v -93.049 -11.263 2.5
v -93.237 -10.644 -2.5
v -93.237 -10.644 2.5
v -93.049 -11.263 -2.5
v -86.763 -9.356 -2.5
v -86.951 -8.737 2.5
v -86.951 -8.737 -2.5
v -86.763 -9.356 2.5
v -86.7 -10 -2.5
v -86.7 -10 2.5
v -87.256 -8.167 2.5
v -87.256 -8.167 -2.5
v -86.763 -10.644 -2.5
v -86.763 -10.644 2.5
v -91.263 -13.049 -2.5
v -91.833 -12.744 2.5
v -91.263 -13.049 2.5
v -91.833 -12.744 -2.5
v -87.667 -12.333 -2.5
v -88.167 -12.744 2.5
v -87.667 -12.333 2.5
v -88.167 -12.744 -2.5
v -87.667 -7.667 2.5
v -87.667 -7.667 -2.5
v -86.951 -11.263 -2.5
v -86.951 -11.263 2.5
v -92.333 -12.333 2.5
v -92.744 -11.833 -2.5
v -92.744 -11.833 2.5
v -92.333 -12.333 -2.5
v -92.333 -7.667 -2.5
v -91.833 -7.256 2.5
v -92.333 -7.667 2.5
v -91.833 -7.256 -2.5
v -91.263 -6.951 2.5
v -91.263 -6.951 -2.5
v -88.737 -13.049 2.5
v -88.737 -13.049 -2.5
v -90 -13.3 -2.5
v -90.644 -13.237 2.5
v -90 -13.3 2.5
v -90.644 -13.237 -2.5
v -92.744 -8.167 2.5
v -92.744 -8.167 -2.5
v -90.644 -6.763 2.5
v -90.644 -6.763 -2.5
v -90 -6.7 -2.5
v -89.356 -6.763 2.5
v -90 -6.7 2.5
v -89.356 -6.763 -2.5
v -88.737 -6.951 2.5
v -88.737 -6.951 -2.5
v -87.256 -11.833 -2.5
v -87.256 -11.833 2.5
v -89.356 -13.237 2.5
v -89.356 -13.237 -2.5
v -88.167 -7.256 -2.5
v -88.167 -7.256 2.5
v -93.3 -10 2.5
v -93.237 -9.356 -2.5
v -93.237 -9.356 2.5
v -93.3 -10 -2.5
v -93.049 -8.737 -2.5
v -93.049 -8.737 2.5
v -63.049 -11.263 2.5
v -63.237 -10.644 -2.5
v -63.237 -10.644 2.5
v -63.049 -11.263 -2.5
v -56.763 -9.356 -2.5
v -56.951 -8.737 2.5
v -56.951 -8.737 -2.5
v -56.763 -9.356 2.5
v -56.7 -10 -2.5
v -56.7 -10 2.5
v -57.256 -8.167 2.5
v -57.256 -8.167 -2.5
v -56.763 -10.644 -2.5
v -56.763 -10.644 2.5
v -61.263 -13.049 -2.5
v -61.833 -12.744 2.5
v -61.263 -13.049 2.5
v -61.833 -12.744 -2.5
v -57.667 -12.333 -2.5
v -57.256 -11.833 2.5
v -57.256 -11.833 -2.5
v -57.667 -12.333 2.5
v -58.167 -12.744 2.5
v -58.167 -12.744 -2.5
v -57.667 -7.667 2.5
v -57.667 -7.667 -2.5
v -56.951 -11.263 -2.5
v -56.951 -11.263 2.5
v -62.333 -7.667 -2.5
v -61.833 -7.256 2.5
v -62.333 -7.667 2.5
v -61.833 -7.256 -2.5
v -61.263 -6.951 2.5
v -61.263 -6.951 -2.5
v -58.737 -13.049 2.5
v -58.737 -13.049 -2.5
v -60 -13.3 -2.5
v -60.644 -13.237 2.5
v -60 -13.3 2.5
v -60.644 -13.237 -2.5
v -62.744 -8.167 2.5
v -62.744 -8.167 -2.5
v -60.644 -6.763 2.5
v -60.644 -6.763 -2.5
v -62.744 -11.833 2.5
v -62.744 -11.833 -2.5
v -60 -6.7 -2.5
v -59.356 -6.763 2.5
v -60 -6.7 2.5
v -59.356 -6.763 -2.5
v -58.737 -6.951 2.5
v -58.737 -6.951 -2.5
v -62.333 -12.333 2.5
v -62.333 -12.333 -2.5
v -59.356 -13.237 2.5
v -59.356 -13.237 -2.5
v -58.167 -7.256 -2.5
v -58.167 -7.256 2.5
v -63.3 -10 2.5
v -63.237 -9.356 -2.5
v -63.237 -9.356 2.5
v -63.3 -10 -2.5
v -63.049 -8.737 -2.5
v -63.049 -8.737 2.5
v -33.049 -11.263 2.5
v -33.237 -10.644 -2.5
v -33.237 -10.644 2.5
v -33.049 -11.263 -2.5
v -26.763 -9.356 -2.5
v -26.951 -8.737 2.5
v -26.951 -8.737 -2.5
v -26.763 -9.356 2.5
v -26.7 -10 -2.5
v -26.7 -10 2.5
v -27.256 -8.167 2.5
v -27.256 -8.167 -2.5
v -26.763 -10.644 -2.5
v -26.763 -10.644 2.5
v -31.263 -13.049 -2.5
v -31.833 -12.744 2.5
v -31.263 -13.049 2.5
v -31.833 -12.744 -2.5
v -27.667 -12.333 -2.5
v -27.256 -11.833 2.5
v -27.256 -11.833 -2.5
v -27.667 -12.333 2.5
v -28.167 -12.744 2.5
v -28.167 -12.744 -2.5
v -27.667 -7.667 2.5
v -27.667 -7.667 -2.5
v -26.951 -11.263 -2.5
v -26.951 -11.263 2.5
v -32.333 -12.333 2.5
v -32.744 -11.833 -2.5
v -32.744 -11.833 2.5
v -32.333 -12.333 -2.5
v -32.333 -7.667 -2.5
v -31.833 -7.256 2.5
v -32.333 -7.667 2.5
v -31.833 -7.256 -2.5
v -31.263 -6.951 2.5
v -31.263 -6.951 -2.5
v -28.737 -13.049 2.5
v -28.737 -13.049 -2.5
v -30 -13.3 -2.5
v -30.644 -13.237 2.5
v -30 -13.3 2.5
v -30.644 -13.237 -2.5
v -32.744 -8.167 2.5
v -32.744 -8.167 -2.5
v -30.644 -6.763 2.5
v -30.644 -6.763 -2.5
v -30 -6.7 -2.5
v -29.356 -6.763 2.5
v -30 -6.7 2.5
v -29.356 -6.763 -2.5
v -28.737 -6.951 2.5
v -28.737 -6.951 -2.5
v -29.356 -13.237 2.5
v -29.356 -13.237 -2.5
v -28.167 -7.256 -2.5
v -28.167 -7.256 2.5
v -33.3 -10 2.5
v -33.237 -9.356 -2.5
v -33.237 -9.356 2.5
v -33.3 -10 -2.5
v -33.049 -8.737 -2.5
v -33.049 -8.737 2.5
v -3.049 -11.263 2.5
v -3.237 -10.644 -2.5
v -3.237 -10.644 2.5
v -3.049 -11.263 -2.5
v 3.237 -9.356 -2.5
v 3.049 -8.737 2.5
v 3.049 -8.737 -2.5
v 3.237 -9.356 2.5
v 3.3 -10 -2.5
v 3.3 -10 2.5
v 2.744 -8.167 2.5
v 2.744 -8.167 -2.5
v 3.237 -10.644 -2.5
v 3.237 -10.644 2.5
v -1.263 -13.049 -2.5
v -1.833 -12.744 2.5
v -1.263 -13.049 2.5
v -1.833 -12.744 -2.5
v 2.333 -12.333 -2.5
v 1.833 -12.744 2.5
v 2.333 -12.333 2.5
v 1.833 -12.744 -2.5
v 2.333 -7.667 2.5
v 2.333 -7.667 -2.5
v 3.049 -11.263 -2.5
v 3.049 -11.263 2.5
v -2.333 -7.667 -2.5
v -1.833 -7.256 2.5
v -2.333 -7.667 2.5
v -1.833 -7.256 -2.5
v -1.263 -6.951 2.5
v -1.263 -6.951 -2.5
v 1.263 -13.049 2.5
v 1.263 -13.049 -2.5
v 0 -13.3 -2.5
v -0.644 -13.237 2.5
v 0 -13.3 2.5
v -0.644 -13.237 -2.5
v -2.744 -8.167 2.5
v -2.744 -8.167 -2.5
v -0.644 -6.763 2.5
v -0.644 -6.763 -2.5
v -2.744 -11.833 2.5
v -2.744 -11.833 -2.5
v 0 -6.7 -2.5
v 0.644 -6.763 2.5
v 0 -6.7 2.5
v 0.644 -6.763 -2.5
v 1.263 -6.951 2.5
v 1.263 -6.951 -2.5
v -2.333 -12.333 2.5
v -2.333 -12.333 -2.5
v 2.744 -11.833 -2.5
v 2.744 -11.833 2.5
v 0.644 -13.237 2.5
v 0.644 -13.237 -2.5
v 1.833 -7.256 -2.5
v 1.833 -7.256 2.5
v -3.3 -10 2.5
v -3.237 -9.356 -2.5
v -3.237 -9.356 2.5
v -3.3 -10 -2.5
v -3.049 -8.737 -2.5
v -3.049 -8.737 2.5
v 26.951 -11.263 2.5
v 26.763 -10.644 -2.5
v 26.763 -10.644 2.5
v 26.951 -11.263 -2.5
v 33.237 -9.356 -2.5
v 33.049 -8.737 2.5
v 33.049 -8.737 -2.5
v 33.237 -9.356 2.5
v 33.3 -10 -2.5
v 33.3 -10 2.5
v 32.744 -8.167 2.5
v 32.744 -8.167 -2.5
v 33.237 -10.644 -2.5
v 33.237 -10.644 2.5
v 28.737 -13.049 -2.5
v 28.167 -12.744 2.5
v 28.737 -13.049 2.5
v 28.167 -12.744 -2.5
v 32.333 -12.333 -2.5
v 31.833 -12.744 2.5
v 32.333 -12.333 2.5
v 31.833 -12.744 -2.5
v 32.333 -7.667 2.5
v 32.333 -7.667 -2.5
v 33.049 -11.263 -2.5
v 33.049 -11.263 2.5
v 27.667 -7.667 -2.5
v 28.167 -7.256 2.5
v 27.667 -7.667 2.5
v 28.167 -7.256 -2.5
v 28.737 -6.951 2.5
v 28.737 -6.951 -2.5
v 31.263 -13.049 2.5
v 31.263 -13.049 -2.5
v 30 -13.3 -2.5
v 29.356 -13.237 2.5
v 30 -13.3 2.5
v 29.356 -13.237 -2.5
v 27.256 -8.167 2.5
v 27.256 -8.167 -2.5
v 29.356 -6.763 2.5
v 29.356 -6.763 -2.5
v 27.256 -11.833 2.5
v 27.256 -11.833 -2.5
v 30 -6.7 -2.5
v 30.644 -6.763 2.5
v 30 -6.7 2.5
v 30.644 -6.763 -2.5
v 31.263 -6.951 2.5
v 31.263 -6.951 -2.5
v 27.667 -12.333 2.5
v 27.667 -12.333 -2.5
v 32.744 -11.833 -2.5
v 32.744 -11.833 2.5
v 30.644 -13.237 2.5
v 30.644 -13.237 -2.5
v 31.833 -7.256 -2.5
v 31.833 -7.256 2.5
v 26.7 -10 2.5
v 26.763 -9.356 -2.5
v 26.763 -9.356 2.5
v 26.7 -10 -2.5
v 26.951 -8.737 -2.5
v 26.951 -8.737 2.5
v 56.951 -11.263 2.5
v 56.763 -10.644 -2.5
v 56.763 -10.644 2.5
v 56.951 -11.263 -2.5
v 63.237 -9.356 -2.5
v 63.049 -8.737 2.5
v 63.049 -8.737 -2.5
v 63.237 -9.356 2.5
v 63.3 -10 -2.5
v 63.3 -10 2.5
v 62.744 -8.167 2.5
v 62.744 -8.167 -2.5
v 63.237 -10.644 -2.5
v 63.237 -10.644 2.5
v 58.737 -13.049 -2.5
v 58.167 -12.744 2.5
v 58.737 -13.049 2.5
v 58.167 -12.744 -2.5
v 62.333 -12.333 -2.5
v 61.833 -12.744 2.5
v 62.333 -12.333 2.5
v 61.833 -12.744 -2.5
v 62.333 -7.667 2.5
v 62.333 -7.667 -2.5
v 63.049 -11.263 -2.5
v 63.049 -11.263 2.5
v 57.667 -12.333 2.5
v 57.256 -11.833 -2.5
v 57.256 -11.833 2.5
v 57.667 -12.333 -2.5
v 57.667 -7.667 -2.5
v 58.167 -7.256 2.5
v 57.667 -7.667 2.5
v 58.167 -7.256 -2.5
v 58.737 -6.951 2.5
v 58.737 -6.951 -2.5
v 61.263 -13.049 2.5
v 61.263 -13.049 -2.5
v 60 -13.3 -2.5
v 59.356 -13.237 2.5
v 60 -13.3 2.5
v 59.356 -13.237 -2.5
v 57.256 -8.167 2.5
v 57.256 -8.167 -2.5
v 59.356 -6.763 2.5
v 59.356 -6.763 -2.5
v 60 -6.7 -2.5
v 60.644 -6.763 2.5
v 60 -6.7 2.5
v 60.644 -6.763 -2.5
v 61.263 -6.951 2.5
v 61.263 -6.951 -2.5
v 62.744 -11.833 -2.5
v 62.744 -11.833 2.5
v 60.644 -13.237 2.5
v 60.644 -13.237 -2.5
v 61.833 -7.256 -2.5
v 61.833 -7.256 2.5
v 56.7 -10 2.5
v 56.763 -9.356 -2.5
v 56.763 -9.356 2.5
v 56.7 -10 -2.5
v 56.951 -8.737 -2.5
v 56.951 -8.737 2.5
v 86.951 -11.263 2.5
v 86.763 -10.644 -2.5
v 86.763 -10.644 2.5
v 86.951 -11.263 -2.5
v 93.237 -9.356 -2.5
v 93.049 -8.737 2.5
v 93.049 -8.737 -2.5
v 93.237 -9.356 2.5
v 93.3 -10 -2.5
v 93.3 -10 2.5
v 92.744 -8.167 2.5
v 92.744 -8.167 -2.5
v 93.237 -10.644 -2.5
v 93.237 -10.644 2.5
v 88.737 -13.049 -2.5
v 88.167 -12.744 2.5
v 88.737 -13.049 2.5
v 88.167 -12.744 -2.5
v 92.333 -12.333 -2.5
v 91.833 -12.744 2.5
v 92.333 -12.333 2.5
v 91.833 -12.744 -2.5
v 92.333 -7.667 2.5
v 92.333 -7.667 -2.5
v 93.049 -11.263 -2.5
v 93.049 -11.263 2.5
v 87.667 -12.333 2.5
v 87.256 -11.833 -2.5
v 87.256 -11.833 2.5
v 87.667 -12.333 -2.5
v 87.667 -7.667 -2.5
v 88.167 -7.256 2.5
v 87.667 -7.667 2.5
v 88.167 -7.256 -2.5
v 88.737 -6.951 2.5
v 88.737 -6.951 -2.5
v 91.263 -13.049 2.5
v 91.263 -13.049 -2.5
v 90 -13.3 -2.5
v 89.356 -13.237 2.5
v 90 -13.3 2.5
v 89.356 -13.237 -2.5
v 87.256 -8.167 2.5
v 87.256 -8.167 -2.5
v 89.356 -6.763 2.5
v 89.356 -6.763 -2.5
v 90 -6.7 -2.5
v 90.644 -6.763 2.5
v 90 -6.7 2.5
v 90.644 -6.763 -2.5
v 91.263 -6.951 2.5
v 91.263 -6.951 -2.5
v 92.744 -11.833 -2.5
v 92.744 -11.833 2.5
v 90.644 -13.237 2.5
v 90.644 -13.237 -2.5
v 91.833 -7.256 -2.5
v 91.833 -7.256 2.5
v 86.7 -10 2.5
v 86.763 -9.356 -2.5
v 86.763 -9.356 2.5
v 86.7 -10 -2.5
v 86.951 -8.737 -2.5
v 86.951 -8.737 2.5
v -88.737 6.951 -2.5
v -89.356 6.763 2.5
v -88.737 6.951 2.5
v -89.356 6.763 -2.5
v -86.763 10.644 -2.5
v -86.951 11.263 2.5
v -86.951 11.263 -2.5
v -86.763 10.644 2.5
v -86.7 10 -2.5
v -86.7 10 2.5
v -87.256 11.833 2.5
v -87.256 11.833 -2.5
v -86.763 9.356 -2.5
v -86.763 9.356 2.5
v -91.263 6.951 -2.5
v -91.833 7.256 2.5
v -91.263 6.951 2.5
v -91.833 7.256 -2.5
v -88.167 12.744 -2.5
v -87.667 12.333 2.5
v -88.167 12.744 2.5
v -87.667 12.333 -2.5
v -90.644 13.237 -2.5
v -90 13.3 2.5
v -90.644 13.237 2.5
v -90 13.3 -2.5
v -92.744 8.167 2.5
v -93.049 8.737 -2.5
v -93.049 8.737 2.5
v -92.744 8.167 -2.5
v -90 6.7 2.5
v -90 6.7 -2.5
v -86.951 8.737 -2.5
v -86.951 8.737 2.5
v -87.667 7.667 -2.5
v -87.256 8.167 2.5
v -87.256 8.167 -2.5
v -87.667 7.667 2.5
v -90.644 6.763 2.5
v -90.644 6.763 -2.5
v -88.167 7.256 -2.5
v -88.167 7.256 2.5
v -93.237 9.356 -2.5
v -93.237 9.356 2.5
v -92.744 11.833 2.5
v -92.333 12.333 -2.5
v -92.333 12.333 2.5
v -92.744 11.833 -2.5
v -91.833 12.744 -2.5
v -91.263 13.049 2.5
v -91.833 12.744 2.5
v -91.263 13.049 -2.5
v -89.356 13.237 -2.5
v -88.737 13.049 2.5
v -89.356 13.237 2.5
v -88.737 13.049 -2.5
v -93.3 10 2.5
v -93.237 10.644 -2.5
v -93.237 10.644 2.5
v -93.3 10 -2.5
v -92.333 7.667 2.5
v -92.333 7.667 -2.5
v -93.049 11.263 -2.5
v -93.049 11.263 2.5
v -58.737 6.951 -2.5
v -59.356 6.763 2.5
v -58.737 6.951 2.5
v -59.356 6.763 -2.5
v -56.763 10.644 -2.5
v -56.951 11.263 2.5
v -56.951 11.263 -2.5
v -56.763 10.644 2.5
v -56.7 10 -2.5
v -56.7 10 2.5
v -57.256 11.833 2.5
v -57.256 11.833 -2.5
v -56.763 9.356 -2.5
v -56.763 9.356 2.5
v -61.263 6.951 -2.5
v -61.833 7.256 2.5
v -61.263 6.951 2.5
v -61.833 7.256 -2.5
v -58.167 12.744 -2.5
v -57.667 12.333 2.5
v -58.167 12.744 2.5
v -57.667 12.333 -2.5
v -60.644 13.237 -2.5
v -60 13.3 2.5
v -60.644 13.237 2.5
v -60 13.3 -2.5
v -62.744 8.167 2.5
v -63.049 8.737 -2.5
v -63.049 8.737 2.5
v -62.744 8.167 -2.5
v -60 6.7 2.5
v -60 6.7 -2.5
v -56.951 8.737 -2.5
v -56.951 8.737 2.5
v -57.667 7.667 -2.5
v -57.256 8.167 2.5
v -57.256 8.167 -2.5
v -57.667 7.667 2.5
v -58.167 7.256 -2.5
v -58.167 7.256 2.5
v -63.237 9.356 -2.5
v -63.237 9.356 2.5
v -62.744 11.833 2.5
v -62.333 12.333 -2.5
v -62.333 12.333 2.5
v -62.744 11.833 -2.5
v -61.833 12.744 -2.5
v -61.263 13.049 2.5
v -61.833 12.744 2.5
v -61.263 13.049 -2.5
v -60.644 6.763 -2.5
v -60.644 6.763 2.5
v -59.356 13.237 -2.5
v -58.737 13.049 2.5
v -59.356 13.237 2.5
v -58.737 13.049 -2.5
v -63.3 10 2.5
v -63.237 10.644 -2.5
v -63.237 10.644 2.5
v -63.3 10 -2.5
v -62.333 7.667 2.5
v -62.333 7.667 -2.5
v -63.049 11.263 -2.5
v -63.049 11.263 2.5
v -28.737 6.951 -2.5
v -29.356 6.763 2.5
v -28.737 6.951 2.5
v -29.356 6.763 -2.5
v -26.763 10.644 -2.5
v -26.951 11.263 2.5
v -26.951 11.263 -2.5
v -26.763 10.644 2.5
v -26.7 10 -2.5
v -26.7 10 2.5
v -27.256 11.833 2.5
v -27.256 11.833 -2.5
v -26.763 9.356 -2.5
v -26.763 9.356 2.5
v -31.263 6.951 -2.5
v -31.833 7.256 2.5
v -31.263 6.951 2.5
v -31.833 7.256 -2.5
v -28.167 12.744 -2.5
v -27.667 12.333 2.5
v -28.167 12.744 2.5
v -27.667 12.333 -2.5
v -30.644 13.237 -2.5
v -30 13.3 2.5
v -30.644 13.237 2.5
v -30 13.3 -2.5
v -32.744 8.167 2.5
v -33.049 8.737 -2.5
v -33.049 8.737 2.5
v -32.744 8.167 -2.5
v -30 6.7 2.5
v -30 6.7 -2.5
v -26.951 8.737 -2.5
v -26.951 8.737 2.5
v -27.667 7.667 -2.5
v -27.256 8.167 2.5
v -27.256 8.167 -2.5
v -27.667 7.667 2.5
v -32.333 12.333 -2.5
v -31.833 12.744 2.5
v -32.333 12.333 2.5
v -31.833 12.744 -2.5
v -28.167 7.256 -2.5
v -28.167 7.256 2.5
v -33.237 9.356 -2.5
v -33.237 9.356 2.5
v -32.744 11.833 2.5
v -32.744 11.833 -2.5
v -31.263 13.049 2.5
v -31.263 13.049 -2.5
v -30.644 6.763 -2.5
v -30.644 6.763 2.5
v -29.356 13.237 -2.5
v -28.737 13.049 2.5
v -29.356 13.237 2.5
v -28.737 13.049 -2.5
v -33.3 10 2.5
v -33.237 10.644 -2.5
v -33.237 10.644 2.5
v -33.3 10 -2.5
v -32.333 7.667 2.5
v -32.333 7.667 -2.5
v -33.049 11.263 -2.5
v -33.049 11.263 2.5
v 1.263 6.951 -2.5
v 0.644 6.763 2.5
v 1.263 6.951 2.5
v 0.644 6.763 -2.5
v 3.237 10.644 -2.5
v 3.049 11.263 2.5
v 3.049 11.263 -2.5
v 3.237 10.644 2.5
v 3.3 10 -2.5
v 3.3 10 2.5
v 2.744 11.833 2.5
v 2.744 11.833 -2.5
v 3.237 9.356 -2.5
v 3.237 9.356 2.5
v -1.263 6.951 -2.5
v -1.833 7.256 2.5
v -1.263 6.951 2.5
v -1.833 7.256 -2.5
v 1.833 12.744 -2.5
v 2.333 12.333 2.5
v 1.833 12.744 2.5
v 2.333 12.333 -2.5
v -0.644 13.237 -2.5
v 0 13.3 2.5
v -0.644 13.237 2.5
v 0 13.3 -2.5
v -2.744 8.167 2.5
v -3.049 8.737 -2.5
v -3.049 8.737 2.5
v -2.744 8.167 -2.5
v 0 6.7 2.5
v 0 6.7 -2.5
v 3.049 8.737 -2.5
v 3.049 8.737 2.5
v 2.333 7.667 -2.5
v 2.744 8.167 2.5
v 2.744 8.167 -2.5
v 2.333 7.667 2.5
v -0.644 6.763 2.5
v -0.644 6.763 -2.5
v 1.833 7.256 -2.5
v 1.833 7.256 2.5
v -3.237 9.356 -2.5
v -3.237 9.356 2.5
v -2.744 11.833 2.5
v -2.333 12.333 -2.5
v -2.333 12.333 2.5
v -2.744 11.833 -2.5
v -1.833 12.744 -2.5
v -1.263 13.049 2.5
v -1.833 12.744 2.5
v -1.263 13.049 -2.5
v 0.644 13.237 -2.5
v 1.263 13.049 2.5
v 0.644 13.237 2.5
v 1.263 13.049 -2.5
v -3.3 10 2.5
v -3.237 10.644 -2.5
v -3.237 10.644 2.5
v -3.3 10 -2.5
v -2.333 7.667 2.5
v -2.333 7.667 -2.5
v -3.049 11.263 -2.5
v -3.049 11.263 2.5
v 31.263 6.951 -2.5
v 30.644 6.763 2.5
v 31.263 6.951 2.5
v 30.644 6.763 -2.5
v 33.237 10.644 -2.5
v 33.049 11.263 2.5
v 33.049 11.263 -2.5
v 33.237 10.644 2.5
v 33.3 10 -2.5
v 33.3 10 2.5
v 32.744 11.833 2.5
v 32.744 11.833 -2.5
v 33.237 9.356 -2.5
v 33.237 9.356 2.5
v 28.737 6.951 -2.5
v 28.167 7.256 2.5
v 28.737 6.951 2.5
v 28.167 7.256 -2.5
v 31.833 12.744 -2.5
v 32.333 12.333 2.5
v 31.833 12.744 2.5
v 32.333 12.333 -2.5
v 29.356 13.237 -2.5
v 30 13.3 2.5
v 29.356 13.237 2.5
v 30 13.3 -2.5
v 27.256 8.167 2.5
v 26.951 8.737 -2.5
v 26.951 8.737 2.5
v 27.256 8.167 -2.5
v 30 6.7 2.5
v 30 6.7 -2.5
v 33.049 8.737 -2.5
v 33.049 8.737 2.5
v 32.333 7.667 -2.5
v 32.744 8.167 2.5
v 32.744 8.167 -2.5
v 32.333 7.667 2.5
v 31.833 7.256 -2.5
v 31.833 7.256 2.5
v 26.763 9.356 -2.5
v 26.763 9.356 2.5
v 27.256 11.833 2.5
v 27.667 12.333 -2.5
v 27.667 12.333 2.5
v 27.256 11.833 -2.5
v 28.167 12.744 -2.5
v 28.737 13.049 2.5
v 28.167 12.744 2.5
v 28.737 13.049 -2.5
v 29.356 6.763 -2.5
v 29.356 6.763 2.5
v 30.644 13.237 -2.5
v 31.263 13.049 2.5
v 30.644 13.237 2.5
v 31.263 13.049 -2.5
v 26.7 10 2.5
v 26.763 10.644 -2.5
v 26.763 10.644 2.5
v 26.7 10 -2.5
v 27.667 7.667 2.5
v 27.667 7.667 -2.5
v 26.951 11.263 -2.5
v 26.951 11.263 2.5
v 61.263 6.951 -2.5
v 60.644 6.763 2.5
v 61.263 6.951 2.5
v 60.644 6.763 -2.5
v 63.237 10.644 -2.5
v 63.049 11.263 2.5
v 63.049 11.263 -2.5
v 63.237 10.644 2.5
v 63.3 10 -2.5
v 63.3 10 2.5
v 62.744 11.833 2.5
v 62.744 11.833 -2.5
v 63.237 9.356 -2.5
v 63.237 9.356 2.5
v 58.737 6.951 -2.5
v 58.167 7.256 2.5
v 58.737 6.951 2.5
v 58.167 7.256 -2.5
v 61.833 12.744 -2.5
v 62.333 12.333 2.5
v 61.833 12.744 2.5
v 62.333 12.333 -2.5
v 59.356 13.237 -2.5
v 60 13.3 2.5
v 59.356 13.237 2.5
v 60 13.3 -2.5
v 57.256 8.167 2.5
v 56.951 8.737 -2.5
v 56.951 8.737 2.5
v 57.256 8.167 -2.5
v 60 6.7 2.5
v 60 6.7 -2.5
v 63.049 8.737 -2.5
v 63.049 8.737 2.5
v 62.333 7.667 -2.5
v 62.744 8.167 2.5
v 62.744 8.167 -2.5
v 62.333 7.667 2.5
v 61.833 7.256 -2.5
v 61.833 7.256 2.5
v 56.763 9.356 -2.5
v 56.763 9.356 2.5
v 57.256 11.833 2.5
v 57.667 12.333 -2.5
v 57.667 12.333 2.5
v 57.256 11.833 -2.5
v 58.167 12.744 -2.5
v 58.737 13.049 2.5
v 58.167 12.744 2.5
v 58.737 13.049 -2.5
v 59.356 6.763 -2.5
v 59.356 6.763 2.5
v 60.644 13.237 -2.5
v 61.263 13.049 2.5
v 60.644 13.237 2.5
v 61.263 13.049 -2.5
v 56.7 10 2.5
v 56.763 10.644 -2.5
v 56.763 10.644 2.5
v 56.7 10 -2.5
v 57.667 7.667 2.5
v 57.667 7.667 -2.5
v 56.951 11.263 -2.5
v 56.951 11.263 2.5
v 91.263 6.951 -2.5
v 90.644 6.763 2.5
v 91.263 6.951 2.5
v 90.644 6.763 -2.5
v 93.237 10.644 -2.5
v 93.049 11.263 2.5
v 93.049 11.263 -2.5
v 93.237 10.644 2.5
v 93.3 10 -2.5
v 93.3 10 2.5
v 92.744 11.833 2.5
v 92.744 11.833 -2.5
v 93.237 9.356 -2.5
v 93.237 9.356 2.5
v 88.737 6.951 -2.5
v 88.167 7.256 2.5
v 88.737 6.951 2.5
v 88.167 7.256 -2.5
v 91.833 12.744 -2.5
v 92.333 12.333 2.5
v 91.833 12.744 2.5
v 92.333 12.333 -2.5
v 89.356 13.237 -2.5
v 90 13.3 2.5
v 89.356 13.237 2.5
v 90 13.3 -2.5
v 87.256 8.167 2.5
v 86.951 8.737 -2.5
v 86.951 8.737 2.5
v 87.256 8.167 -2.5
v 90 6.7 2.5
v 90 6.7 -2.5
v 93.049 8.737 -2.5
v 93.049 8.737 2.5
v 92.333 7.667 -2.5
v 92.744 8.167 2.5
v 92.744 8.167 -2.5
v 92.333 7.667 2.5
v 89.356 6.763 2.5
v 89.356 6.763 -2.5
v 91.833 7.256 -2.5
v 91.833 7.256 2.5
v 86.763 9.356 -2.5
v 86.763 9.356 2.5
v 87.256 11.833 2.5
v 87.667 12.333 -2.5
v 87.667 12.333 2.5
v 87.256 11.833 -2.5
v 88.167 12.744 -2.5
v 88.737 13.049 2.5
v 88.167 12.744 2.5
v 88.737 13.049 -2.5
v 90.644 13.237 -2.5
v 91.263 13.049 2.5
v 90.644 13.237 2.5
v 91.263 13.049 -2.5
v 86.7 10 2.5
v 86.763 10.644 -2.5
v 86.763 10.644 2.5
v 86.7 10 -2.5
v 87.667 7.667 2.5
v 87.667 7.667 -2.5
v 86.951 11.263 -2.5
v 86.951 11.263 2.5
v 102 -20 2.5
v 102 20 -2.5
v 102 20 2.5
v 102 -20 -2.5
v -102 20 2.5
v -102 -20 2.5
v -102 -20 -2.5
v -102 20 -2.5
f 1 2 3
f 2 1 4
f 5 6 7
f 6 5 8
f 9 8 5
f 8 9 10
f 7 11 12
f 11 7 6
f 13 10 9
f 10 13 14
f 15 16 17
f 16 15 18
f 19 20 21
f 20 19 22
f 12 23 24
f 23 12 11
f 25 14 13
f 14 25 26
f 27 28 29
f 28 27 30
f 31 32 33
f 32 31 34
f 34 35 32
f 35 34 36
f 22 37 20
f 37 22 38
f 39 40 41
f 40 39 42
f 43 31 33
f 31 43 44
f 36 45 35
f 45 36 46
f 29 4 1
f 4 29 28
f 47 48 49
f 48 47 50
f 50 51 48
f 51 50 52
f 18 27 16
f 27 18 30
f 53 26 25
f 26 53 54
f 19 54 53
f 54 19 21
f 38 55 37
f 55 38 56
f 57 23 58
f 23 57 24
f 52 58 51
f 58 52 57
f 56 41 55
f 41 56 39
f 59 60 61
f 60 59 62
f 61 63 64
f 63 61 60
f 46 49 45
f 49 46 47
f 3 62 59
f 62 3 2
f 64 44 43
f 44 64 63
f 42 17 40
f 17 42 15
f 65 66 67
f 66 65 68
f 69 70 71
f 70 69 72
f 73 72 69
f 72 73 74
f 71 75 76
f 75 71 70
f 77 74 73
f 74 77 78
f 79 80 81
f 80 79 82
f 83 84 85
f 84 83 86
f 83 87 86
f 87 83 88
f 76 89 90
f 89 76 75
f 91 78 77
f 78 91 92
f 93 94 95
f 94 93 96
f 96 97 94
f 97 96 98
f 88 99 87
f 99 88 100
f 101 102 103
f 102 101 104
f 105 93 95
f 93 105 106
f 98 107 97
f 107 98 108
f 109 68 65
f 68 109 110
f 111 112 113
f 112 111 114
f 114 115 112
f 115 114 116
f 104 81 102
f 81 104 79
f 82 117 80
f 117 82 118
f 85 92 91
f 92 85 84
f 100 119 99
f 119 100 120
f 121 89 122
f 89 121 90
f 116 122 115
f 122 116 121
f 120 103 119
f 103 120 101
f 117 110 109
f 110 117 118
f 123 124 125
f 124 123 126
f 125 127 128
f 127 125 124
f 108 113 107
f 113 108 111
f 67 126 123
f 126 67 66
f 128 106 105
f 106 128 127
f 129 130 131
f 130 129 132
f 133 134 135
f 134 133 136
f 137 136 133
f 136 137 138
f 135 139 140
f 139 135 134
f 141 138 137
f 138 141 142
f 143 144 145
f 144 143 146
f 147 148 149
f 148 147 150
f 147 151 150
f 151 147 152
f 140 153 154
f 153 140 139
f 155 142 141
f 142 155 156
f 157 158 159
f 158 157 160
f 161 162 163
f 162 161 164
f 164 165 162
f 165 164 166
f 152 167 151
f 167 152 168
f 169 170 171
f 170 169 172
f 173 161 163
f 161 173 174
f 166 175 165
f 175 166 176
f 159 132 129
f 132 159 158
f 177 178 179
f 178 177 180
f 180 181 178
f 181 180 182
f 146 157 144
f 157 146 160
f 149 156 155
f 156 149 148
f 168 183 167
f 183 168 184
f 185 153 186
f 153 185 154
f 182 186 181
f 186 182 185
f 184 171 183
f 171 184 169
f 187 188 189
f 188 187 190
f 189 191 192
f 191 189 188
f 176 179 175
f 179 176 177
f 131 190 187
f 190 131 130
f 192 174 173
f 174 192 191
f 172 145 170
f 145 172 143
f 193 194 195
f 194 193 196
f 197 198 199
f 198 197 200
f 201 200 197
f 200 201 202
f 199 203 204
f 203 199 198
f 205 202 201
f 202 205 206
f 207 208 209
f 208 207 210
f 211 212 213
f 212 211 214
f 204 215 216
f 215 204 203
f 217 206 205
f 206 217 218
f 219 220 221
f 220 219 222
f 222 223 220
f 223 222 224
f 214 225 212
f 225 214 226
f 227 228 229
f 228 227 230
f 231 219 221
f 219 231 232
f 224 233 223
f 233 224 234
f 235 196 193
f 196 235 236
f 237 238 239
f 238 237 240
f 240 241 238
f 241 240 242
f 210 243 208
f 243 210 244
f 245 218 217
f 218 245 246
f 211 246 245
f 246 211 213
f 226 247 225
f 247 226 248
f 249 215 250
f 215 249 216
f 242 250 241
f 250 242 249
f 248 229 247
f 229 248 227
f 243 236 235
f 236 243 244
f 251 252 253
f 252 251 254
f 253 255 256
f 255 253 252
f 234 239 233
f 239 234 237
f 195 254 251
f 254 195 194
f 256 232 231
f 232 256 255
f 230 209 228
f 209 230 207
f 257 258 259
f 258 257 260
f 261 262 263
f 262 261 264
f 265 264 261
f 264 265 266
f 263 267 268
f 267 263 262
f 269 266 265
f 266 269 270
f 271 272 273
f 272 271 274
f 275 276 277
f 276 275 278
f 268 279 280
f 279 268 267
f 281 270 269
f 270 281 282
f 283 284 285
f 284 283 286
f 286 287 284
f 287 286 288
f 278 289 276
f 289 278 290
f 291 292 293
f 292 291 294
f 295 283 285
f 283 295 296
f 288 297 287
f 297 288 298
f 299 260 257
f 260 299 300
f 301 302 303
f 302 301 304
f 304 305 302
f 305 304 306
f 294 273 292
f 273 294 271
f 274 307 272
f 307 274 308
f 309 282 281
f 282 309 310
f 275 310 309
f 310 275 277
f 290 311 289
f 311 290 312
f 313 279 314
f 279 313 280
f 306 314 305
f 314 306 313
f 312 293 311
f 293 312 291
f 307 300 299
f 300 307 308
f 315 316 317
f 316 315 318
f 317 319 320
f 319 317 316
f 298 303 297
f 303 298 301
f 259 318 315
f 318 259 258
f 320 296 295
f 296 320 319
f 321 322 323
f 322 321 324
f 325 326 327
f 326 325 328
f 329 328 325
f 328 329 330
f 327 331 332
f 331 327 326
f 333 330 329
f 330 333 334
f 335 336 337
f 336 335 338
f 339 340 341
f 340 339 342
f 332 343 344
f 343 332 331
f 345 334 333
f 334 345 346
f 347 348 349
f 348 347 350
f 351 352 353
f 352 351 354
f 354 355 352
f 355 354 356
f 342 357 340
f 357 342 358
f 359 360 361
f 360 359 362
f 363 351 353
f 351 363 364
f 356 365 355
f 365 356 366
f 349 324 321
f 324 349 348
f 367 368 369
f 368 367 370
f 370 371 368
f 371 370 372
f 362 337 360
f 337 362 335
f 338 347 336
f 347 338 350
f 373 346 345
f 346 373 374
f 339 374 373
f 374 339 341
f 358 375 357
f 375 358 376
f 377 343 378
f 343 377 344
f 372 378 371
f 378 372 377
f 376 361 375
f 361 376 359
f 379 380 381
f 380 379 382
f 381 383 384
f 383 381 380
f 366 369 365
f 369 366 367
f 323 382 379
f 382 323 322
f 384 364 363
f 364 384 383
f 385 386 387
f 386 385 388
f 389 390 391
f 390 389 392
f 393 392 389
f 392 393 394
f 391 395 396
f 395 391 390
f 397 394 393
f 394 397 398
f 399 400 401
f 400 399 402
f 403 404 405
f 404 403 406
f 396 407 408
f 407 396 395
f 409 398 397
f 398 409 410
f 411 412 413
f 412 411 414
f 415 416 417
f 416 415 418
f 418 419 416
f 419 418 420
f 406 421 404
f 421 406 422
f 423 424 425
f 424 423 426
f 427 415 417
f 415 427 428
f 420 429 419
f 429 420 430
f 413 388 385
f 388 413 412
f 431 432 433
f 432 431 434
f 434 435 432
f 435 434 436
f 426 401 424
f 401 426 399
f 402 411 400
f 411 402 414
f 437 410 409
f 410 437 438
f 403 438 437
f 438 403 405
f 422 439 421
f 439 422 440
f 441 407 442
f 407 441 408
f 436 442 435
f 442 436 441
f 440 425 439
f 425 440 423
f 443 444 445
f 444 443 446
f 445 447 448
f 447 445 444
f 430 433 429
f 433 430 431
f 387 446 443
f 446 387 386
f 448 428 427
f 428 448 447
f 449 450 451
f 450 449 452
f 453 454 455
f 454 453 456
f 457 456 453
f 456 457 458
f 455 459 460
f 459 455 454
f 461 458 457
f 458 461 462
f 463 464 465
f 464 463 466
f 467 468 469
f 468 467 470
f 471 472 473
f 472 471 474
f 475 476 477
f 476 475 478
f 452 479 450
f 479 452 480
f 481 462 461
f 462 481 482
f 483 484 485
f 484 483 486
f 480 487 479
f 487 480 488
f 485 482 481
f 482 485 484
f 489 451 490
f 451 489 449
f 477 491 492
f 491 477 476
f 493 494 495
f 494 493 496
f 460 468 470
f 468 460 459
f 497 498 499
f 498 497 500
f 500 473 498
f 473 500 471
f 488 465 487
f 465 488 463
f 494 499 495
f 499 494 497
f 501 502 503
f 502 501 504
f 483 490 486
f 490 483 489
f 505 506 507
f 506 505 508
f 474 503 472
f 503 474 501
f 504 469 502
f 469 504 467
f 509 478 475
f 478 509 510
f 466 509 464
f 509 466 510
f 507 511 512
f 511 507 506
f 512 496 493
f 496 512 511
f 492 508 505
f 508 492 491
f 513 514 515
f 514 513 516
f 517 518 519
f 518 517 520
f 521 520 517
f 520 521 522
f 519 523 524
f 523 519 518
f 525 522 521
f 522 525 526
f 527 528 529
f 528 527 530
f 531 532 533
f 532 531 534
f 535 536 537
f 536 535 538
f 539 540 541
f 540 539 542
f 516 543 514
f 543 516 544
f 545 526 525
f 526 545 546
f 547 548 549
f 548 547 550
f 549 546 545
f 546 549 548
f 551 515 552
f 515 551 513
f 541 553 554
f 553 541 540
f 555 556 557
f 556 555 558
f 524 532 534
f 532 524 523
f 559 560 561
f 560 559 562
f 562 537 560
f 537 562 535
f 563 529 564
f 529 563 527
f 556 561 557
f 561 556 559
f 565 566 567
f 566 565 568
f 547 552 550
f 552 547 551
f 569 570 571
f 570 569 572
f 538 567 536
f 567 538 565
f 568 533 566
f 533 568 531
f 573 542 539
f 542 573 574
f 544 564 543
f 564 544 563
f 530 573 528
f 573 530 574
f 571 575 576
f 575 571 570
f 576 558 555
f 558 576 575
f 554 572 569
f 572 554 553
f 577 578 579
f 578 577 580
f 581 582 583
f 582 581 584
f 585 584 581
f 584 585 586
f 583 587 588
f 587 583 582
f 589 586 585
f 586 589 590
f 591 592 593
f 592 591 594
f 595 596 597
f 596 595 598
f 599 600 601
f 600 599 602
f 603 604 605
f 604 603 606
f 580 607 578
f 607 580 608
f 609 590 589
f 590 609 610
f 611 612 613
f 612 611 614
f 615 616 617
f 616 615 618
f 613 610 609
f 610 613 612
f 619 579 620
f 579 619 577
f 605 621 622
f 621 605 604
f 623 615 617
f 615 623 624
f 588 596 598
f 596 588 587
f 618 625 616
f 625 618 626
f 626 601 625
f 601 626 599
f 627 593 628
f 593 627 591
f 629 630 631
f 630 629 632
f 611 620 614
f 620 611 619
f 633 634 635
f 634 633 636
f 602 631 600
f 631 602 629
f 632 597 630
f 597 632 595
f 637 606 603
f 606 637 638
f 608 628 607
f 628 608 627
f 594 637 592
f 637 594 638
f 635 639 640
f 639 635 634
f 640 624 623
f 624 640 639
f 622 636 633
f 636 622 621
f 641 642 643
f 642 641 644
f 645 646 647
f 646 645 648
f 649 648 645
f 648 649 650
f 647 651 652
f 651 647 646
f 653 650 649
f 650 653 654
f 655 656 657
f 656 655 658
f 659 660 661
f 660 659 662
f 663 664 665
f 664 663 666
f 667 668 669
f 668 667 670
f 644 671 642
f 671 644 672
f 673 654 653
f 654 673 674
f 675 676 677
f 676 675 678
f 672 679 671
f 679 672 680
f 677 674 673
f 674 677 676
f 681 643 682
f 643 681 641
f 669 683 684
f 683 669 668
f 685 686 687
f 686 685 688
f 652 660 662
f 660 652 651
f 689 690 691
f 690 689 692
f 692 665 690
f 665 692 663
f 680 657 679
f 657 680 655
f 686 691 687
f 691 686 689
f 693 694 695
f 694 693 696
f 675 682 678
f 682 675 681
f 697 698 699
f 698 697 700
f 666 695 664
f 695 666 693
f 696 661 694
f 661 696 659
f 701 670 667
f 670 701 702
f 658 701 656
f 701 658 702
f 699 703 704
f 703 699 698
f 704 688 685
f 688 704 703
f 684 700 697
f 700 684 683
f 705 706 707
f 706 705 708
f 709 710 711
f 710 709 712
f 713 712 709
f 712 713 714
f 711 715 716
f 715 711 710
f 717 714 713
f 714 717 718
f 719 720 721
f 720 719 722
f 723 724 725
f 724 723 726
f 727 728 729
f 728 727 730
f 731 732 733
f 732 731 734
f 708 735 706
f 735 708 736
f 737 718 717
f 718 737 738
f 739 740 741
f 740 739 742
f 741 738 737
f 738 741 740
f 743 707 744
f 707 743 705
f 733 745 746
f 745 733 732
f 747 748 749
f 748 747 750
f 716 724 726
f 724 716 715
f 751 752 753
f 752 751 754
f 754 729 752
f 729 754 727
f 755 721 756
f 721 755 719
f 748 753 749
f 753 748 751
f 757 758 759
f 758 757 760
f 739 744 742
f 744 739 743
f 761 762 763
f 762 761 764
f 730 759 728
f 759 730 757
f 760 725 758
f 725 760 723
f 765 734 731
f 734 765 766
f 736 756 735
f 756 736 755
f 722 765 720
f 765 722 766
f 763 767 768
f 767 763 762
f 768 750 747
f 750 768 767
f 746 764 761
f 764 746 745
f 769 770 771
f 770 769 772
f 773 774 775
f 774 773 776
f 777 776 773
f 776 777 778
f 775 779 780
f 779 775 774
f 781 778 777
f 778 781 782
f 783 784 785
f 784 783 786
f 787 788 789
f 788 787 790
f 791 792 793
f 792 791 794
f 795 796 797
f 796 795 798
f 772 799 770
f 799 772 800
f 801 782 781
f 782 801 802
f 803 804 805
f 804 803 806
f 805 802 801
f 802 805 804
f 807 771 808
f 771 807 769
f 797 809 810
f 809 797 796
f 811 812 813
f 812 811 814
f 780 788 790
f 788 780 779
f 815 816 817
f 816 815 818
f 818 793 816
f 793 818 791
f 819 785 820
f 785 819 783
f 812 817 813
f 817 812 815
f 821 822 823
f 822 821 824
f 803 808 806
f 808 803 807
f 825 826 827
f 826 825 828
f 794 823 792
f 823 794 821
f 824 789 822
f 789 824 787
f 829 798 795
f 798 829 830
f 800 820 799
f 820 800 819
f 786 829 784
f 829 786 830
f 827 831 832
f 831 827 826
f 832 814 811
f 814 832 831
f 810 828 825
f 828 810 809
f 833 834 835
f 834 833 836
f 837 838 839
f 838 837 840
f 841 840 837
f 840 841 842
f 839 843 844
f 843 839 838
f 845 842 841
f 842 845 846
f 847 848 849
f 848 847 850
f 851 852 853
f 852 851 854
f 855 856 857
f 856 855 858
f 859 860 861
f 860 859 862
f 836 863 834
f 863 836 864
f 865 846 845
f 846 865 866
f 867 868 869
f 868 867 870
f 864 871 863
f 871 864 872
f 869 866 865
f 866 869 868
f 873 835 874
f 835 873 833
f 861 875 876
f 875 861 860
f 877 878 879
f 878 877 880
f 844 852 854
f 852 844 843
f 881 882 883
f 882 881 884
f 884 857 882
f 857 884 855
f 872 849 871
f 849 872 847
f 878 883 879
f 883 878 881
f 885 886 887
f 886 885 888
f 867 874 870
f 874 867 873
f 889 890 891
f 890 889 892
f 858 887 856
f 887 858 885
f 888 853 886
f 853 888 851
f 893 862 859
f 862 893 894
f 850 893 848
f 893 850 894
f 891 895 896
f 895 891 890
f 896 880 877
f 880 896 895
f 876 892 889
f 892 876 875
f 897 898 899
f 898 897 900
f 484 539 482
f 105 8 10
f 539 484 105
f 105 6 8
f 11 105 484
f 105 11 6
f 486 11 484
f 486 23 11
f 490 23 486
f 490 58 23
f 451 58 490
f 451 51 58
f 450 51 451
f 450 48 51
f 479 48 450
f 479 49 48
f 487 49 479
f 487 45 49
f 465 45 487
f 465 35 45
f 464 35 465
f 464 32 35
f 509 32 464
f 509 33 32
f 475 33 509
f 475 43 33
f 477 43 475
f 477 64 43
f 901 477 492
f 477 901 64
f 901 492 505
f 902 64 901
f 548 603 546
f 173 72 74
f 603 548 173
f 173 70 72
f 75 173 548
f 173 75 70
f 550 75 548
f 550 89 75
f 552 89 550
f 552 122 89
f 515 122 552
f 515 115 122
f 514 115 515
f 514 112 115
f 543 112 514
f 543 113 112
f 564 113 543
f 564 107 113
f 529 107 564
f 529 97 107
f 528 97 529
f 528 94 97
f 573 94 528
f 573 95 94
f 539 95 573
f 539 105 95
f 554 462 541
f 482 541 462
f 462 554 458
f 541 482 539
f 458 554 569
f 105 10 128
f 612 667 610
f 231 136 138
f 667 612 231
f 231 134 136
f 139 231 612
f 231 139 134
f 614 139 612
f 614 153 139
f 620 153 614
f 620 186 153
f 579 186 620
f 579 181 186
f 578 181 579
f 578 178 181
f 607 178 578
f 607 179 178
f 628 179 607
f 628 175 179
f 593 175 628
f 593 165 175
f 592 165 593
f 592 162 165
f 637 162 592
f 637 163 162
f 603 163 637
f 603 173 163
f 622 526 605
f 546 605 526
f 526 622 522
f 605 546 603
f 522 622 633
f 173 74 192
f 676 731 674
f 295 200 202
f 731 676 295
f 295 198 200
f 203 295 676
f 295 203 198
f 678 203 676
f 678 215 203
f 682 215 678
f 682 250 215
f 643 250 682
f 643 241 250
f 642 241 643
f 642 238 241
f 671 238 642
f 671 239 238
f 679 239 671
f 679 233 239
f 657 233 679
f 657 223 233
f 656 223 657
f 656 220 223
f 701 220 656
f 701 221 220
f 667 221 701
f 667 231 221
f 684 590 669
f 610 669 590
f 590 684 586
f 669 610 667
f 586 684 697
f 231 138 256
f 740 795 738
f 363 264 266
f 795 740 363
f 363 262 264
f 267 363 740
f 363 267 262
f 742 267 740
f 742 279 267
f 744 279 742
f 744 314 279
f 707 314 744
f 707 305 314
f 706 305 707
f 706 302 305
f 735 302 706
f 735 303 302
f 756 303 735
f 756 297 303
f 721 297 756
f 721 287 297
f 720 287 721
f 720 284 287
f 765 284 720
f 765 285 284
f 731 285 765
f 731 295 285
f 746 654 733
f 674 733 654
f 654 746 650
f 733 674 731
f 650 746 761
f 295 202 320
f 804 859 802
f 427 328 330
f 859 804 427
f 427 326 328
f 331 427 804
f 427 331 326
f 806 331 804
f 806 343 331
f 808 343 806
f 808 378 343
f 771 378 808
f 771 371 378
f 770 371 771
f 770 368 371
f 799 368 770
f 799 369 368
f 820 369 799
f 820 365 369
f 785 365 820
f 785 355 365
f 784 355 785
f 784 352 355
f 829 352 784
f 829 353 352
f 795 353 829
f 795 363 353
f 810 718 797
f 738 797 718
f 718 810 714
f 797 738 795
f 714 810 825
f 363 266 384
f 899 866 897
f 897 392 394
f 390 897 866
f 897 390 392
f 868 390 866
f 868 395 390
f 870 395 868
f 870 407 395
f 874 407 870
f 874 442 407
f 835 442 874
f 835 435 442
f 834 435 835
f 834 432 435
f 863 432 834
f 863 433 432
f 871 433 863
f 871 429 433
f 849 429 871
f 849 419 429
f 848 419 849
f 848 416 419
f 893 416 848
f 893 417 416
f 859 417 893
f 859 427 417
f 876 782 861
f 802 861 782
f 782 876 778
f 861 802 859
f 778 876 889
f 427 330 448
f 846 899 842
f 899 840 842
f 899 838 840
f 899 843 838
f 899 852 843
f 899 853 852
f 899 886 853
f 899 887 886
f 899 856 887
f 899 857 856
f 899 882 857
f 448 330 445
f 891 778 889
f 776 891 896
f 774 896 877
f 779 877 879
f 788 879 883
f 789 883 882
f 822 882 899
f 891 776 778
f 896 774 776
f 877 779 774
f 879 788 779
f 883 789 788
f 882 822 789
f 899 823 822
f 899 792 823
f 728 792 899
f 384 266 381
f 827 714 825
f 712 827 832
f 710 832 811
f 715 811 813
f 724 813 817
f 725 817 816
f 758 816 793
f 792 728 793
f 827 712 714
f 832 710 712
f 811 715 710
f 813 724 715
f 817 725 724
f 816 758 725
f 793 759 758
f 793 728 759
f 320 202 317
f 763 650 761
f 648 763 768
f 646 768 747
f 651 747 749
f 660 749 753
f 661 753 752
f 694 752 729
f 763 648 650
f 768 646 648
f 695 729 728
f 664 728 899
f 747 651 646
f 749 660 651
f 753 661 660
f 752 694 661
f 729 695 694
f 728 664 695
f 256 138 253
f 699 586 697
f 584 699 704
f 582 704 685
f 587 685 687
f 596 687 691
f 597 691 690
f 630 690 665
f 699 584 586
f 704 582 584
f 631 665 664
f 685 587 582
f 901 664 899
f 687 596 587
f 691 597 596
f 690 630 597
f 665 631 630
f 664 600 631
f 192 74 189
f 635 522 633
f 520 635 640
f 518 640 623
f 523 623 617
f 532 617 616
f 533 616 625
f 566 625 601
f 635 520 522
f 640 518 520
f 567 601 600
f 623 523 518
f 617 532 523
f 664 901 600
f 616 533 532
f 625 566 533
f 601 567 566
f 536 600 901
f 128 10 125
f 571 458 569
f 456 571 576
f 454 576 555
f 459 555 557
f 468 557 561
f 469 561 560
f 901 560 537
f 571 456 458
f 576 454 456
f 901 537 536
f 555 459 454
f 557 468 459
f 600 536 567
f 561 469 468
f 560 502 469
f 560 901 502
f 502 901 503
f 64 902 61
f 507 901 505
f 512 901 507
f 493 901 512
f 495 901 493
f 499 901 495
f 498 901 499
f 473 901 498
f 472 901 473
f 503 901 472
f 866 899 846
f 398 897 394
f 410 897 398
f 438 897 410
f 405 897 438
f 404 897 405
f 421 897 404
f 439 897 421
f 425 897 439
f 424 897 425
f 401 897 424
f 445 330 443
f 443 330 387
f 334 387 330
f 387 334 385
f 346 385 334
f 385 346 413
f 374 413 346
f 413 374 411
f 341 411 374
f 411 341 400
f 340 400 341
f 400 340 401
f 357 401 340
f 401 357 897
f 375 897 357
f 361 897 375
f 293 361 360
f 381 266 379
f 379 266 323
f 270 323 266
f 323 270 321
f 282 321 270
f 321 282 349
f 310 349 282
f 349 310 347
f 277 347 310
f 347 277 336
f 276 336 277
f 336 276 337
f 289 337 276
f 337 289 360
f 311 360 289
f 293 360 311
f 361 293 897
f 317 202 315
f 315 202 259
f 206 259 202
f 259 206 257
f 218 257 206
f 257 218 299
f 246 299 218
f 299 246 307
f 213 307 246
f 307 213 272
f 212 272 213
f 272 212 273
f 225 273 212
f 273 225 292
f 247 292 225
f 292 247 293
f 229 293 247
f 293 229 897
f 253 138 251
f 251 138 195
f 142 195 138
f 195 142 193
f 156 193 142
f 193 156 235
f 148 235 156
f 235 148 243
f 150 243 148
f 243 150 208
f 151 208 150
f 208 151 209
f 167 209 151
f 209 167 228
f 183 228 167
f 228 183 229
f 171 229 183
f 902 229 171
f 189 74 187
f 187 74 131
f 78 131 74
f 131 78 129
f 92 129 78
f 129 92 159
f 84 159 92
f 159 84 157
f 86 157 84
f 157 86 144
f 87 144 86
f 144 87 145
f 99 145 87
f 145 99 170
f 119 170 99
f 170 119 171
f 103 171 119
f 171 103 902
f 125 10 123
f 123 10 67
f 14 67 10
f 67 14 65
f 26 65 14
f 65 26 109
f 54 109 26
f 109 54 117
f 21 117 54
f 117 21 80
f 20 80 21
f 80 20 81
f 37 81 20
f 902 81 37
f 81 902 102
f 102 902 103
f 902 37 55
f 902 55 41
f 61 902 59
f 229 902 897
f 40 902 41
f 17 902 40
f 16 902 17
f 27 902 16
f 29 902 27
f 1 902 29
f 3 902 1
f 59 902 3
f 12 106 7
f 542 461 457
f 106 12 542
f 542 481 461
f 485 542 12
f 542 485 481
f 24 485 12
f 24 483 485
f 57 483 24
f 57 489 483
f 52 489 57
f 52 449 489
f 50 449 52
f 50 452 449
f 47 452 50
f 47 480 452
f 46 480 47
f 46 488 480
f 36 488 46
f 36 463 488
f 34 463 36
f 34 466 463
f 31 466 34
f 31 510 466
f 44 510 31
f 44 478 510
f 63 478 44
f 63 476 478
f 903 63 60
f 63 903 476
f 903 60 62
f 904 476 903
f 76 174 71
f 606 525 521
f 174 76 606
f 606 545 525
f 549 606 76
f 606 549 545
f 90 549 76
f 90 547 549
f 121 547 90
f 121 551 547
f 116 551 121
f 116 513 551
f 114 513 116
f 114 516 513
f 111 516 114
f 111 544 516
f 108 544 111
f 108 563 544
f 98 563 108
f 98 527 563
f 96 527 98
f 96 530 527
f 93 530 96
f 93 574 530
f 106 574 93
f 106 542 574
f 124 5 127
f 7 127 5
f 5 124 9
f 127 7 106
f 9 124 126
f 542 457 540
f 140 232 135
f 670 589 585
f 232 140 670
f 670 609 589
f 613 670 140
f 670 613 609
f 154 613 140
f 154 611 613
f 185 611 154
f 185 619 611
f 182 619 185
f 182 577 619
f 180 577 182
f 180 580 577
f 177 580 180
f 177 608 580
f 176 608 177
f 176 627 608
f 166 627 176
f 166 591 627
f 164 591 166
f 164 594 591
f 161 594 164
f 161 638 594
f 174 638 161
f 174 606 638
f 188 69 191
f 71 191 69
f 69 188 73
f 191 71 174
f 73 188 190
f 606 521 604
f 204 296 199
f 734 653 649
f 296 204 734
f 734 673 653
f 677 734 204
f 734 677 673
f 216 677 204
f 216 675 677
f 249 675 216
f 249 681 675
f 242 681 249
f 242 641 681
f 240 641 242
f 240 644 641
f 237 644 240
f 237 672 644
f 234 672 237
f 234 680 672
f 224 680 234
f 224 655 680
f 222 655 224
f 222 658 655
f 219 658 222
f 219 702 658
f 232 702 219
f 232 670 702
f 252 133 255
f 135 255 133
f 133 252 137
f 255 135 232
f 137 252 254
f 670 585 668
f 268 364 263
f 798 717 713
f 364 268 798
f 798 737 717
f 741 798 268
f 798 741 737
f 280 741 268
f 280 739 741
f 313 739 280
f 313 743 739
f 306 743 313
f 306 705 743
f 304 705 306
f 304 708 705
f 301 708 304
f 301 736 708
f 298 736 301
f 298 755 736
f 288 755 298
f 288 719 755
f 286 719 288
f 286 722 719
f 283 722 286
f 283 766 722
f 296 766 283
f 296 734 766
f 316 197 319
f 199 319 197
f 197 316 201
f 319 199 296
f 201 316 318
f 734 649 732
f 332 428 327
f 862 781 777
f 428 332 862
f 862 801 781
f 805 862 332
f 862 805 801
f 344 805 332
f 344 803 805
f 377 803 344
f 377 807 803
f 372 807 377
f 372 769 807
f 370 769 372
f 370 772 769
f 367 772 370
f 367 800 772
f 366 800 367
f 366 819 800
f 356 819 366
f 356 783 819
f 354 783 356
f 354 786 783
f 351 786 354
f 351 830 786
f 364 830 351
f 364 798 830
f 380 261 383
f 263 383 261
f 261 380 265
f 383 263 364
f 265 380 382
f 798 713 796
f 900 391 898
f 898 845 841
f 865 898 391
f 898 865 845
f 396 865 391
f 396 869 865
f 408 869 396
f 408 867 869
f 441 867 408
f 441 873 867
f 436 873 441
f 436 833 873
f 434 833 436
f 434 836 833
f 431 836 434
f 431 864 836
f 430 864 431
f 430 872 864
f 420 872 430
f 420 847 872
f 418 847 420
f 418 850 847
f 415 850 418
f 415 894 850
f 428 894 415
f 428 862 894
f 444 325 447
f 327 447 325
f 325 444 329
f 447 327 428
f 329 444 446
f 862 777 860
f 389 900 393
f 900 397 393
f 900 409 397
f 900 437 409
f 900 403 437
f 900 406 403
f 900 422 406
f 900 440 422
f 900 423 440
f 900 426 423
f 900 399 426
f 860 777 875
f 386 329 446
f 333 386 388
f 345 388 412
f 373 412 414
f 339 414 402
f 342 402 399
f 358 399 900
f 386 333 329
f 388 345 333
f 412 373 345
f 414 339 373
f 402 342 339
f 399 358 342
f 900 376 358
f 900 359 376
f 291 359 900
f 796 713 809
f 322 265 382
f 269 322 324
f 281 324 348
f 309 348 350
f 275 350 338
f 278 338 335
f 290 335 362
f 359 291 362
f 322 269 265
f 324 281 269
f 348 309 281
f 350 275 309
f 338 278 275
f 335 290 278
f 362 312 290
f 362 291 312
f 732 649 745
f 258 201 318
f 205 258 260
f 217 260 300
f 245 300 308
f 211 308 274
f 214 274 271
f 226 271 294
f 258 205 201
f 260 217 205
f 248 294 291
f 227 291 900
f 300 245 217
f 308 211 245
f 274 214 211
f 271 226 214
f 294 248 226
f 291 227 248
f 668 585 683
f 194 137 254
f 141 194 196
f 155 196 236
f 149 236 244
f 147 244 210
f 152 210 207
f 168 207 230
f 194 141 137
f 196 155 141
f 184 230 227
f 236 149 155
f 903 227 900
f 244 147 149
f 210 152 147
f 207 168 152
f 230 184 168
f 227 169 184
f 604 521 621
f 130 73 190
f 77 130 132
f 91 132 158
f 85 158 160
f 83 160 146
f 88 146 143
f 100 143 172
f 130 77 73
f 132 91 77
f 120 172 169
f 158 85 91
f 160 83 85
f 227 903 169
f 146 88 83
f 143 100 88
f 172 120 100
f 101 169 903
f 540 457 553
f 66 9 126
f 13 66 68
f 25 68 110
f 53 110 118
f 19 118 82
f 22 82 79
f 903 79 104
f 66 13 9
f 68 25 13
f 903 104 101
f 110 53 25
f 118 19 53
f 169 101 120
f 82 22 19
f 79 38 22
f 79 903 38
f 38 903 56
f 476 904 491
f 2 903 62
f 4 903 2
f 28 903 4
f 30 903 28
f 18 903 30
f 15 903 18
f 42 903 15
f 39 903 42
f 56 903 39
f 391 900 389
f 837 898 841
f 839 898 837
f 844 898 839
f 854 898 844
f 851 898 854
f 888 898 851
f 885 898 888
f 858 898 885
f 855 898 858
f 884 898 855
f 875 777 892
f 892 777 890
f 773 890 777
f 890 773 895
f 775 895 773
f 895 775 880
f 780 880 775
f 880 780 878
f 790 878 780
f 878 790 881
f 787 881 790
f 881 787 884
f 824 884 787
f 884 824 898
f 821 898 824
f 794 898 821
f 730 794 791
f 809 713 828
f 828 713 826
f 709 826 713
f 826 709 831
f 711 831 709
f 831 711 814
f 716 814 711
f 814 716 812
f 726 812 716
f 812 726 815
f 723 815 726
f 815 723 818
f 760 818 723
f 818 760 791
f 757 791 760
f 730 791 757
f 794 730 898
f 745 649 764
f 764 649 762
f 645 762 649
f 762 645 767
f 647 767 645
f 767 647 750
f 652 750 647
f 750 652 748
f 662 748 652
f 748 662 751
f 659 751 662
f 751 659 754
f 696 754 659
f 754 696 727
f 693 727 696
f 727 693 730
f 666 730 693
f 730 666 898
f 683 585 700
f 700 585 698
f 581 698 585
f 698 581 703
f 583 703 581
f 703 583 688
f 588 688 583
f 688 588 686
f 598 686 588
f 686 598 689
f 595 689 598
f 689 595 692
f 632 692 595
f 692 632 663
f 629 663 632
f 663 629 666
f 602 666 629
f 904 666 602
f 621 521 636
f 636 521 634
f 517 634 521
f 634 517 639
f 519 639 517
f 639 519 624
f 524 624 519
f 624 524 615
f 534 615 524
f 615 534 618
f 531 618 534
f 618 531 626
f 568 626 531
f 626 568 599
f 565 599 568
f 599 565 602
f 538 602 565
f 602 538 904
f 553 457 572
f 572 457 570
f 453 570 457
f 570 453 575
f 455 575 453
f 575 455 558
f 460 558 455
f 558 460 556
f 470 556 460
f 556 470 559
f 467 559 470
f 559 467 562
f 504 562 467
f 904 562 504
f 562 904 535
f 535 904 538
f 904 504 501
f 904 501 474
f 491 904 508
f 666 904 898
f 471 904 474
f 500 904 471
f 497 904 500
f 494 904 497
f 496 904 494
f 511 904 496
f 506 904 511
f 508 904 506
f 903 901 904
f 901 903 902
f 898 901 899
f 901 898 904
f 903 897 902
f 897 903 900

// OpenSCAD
$fn = 32;

// ----------------------------------------------------------------------
// Hole bar, 7 x Ø6.6
// tworows layout, 12 mm edge offset
// ----------------------------------------------------------------------

// --- parameters (mm) ---
bar_w = 40;       // bar width (Y)
bar_t = 5;        // bar thickness (Z)
holes = 7;        // holes per row
hole_d = 6.6;     // hole diameter
edge = 12;        // offset from the bar end to the first hole
pitch = 30;       // pitch between neighbouring holes
row_offset = 20;  // distance between the two rows

// --- derived feature positions (mm) ---
span = (holes - 1) * pitch;   // = 180   distance between the end holes
bar_l = span + 2 * edge;      // = 204   overall bar length
start_x = -bar_l / 2 + edge;  // = -90   X of the first hole
feature_centers = [
  [start_x + 0 * pitch, -row_offset / 2],
  [start_x + 1 * pitch, -row_offset / 2],
  [start_x + 2 * pitch, -row_offset / 2],
  [start_x + 3 * pitch, -row_offset / 2],
  [start_x + 4 * pitch, -row_offset / 2],
  [start_x + 5 * pitch, -row_offset / 2],
  [start_x + 6 * pitch, -row_offset / 2]
];   // hole centres of the first row
row2_centers = [
  [start_x + 0 * pitch, row_offset / 2],
  [start_x + 1 * pitch, row_offset / 2],
  [start_x + 2 * pitch, row_offset / 2],
  [start_x + 3 * pitch, row_offset / 2],
  [start_x + 4 * pitch, row_offset / 2],
  [start_x + 5 * pitch, row_offset / 2],
  [start_x + 6 * pitch, row_offset / 2]
];   // hole centres of the second row

// bar with two rows of holes, both read from their own centre arrays
difference() {
  translate([-bar_l / 2, -bar_w / 2, -bar_t / 2]) cube([bar_l, bar_w, bar_t]);
  for (centre = feature_centers)
    translate([centre[0], centre[1], 0])
      cylinder(d = hole_d, h = bar_t + 2, center = true);
  for (centre = row2_centers)
    translate([centre[0], centre[1], 0])
      cylinder(d = hole_d, h = bar_t + 2, center = true);
}
